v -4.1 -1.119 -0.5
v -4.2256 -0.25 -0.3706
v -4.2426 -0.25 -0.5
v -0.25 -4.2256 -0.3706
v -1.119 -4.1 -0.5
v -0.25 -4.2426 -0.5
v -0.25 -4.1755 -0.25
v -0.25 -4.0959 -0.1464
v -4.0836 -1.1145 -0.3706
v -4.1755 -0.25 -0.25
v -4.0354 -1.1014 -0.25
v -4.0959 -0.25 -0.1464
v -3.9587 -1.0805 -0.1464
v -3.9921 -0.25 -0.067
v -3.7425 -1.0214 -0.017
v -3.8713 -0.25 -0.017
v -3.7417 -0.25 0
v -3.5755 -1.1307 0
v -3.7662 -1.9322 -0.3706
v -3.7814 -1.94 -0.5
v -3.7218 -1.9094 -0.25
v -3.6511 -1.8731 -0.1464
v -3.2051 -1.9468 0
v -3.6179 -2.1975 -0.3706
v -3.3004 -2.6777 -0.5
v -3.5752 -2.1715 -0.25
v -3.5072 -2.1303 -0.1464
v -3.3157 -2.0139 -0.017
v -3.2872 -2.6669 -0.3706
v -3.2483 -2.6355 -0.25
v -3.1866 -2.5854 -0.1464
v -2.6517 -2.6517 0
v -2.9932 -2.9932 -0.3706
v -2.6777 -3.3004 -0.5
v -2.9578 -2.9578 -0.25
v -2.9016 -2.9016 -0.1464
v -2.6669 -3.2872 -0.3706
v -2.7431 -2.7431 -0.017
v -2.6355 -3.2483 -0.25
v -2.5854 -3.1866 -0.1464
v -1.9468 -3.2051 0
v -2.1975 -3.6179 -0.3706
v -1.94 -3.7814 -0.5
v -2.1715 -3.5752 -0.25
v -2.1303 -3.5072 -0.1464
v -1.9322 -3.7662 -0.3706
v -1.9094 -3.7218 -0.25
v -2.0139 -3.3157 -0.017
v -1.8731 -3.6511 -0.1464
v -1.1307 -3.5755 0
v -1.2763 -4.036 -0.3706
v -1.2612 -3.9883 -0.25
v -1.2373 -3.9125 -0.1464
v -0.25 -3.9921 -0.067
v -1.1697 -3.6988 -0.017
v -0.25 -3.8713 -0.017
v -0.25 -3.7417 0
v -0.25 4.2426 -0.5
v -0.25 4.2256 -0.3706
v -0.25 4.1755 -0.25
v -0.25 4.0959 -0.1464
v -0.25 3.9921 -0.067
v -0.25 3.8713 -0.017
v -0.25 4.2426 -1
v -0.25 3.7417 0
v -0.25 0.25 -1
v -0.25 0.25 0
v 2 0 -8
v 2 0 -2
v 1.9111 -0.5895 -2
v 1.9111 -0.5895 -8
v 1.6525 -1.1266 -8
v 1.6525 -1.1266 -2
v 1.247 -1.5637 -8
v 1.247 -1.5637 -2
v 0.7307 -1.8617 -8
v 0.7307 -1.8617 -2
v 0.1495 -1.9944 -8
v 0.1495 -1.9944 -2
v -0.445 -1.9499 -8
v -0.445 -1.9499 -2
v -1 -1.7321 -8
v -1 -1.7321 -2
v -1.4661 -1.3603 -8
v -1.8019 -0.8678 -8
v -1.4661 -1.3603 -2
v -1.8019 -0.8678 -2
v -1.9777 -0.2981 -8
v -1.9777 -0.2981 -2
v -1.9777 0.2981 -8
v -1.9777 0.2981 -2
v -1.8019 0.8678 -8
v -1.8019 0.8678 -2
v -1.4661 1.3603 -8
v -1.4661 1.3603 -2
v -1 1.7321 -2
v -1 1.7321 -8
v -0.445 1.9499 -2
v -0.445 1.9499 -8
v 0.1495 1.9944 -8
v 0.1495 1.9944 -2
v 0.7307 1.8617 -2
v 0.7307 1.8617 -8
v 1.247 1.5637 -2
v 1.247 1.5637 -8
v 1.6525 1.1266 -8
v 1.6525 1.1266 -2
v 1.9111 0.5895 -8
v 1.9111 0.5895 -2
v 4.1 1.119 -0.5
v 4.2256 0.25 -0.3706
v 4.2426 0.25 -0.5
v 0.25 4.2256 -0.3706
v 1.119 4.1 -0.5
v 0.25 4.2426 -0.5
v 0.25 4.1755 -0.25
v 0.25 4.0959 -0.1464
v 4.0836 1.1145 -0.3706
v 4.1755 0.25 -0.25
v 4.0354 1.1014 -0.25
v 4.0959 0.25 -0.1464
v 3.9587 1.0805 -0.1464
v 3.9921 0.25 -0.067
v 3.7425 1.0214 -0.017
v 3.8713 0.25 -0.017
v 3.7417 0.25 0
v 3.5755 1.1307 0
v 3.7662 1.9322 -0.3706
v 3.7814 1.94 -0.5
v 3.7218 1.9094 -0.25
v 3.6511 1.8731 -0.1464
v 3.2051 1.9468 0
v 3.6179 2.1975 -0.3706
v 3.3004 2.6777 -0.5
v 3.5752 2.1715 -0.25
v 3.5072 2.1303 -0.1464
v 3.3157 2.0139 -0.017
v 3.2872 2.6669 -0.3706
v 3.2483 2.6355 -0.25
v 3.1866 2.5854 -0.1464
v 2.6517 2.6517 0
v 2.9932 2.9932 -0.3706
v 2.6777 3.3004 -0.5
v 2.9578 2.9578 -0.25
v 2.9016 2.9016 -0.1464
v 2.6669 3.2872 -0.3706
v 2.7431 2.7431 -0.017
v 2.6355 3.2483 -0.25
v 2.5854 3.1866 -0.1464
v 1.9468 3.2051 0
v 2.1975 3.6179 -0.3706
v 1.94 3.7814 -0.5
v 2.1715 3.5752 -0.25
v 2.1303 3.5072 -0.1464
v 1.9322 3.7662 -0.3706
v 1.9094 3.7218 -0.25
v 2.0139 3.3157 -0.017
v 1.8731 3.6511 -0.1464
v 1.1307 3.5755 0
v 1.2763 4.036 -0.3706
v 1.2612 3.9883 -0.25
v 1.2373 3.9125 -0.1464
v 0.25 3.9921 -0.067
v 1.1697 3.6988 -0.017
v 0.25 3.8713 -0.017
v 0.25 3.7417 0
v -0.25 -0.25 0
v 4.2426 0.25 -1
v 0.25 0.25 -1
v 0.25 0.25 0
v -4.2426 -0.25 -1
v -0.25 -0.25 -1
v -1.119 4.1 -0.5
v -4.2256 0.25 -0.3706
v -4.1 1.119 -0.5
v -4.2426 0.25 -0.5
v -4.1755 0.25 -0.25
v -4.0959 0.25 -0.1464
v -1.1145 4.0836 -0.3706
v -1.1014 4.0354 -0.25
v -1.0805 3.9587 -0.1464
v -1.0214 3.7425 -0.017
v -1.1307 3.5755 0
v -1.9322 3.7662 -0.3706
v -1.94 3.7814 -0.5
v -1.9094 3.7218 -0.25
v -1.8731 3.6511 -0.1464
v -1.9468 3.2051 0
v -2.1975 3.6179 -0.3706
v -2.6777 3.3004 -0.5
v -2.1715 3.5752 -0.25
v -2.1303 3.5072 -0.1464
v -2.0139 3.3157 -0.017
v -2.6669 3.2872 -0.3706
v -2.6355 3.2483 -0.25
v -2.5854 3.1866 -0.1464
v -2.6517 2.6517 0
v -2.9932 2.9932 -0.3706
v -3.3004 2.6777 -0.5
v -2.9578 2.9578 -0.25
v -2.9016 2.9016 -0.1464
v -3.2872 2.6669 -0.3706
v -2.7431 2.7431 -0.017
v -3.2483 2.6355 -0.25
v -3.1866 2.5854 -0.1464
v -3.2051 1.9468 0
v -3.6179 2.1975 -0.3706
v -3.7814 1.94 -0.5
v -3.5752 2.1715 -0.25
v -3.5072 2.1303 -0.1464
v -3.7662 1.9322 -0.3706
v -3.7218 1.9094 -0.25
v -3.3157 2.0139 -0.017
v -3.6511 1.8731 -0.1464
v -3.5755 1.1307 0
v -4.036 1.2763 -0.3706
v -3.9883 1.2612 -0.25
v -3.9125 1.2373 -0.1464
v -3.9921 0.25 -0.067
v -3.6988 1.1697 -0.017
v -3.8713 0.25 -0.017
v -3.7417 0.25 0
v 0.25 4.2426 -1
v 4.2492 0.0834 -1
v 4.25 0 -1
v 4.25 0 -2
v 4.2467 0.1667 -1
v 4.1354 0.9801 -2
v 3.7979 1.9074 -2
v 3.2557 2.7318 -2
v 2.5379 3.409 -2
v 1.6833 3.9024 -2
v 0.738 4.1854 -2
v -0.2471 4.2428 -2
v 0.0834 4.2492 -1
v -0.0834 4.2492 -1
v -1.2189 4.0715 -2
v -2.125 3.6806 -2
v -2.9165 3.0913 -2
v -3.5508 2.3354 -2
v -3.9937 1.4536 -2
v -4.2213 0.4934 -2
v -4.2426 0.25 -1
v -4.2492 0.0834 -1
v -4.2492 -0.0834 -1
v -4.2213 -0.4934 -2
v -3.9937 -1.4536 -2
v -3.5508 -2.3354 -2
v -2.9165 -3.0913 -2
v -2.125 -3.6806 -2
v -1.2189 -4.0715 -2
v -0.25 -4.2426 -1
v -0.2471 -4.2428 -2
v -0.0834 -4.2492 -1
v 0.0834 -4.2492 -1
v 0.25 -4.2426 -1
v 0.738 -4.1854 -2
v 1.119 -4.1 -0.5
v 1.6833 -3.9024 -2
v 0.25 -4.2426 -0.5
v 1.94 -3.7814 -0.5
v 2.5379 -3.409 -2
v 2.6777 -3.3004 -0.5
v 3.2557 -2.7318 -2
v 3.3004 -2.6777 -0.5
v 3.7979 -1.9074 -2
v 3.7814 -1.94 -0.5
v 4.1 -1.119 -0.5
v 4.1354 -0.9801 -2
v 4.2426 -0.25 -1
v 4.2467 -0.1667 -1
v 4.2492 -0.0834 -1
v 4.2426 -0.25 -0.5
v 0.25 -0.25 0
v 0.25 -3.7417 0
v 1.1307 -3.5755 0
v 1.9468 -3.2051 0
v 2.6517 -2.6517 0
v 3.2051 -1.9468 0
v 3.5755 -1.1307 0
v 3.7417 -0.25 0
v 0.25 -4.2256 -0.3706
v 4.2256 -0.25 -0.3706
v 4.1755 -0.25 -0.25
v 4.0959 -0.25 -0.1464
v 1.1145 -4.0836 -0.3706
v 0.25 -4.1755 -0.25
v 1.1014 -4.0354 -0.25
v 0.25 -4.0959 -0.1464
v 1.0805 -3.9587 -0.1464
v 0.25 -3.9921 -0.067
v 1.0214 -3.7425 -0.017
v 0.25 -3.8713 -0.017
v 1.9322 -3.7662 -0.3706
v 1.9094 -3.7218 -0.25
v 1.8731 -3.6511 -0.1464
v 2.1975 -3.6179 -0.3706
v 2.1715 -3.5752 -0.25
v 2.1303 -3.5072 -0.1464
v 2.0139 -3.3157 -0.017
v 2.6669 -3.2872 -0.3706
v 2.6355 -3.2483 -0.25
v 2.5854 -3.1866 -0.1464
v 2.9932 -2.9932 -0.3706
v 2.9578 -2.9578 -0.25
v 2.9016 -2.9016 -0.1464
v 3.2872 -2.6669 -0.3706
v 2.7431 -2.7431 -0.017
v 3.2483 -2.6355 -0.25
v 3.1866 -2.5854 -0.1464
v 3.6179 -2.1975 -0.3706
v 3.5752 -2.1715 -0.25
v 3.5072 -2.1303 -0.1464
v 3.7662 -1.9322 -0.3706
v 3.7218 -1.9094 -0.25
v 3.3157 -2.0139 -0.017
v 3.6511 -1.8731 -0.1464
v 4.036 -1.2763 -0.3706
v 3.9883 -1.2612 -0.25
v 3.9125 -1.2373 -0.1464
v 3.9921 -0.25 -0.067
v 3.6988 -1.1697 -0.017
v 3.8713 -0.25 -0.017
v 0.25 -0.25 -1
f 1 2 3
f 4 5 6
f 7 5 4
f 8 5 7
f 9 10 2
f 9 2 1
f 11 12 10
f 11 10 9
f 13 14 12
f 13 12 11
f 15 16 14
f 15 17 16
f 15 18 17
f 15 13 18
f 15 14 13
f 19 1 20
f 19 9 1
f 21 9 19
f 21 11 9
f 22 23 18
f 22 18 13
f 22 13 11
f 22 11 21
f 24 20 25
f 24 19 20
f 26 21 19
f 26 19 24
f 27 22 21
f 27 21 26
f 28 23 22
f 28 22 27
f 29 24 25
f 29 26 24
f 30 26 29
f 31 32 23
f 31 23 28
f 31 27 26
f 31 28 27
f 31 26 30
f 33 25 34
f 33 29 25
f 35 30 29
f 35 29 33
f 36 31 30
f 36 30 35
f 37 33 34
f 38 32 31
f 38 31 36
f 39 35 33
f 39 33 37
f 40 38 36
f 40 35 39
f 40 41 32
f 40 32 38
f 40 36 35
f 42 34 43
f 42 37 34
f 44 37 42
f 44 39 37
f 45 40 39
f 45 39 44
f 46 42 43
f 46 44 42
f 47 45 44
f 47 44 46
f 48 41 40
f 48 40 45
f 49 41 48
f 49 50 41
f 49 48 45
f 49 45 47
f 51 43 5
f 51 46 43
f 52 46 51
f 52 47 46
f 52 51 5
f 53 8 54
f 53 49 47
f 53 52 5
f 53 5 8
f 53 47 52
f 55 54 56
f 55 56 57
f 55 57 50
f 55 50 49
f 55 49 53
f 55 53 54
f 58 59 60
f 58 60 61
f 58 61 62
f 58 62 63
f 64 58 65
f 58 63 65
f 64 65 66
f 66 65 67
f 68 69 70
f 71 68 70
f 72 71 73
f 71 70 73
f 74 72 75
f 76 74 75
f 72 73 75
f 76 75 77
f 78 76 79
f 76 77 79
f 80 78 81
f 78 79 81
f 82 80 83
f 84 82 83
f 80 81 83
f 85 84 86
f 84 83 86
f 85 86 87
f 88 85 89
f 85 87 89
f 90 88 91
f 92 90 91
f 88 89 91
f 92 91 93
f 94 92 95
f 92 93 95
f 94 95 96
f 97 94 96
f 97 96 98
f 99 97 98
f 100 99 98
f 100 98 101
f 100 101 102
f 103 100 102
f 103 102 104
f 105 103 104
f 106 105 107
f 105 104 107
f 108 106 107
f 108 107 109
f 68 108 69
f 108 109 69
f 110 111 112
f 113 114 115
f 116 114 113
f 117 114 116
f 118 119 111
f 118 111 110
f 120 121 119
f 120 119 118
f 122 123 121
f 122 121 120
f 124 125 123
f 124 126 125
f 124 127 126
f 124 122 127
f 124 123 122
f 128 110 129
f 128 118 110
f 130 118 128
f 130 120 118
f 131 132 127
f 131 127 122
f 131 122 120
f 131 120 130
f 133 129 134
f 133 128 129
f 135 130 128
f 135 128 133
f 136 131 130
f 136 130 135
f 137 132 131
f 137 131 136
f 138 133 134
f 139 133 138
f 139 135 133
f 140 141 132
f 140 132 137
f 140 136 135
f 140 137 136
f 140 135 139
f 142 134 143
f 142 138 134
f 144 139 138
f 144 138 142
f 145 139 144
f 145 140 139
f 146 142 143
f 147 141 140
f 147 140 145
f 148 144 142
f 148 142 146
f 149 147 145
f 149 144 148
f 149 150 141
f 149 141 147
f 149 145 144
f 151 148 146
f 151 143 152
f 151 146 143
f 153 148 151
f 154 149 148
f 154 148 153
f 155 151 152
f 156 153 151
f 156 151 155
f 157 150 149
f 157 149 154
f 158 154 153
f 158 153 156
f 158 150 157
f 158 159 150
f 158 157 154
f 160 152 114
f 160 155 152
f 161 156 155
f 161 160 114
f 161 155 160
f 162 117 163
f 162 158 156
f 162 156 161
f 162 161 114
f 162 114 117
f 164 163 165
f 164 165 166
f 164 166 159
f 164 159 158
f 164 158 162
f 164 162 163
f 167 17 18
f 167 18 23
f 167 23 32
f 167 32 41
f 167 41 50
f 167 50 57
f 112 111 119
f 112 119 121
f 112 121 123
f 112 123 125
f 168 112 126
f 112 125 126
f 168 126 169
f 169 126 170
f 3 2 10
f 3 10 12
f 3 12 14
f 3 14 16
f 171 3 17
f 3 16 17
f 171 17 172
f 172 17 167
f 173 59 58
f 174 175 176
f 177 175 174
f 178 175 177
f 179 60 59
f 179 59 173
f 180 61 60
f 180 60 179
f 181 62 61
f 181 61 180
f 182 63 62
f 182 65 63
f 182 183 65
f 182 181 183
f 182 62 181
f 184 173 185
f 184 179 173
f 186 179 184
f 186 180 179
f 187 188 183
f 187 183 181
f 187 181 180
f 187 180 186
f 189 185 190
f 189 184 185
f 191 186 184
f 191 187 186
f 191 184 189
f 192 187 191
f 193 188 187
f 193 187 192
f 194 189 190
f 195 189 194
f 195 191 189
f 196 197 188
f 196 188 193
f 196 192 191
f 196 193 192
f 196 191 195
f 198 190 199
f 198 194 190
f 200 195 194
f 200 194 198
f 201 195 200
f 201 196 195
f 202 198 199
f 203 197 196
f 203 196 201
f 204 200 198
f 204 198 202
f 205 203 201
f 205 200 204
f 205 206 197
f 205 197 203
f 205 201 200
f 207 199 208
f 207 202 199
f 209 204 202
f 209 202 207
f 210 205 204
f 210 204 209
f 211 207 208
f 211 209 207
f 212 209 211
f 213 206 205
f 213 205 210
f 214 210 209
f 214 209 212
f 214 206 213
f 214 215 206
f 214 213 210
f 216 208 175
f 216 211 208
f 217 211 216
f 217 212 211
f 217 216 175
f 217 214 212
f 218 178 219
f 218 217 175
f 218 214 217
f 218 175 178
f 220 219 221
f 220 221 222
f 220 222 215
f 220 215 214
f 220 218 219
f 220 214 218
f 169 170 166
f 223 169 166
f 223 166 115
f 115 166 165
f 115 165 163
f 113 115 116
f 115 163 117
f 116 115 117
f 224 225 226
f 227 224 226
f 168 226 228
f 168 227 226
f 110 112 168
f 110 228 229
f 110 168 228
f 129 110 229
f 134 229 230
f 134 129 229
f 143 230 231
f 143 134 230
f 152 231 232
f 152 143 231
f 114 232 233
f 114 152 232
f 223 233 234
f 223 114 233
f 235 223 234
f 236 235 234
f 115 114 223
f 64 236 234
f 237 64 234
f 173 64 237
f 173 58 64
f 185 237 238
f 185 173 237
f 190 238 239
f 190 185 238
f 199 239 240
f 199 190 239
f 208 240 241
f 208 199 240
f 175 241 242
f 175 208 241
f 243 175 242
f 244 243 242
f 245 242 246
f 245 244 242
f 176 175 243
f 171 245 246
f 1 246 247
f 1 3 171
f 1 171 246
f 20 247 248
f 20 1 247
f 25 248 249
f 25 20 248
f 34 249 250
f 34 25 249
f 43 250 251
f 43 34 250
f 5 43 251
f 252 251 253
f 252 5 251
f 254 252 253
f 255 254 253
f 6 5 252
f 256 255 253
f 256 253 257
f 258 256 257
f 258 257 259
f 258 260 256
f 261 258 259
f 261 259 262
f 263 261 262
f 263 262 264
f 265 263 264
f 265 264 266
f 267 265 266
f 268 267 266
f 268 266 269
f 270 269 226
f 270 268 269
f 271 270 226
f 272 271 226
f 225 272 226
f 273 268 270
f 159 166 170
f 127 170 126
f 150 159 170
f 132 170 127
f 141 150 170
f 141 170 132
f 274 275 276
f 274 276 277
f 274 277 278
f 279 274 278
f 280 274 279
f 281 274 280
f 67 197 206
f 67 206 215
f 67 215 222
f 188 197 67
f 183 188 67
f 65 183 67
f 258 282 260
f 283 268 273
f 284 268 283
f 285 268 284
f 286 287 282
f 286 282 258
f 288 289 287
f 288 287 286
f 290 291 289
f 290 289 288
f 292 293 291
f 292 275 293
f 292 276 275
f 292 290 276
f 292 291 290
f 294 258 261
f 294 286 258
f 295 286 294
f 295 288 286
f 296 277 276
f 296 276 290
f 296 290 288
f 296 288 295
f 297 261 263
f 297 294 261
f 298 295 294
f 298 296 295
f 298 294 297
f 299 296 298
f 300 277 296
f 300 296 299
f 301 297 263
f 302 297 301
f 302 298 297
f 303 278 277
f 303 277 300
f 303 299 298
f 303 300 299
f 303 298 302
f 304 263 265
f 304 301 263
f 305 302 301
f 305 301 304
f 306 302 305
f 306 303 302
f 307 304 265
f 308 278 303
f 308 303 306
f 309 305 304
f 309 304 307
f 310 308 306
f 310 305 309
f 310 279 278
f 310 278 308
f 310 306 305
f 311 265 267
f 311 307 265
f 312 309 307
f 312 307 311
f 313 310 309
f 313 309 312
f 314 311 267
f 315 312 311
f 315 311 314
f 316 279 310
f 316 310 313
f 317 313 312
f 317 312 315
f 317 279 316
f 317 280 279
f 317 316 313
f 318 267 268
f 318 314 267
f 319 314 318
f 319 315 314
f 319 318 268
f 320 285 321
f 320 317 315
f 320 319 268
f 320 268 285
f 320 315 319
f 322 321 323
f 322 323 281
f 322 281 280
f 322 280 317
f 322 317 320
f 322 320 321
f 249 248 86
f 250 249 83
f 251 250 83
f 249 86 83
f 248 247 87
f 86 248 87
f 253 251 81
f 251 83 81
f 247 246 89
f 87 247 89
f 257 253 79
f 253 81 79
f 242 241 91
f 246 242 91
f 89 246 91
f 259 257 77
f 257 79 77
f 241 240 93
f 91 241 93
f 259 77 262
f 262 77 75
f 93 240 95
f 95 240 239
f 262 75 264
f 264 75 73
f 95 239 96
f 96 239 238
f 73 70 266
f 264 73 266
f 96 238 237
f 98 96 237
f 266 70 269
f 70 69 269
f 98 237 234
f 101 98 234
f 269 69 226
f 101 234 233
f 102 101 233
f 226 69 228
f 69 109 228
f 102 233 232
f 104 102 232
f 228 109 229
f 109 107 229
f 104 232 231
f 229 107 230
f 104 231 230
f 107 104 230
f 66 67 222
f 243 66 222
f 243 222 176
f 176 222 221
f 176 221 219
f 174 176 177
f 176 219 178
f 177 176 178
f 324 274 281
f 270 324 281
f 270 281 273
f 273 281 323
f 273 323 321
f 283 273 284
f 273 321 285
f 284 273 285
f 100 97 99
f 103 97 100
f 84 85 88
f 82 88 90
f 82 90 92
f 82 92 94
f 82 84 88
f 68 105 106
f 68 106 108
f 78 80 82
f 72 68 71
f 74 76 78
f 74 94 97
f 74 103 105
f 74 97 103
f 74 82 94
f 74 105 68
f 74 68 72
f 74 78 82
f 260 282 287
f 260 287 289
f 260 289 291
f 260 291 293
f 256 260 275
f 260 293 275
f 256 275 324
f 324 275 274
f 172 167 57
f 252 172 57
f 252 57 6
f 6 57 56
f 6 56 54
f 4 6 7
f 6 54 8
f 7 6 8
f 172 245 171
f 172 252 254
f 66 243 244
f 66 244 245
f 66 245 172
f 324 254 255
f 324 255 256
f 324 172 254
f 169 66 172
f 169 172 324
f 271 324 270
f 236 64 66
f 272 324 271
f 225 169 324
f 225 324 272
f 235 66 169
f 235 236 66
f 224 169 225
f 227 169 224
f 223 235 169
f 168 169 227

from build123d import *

# Parameters (mm, degrees)
SKETCH1_R           = 4.25
BOSS_EXTRUDE1_DEPTH = 2
SKETCH2_R           = 2
BOSS_EXTRUDE2_DEPTH = 6
CUT_EXTRUDE1_DEPTH  = 1
FILLET1_R           = 0.5


with BuildPart() as part:
    # Sketch1 → Boss-Extrude1 (new body)
    with BuildSketch(Plane.XY):
        Circle(SKETCH1_R)
    extrude(amount=-BOSS_EXTRUDE1_DEPTH)

    # Sketch2 → Boss-Extrude2 (add)
    with BuildSketch(Plane(origin=(0, 0, -2), x_dir=(-1, 0, 0), z_dir=(0, 0, -1))):
        with Locations(Location((0, 0, 0), (0, 0, 180))):
            Circle(SKETCH2_R)
    extrude(amount=BOSS_EXTRUDE2_DEPTH)

    # Sketch3 → Cut-Extrude1 (cut)
    with BuildSketch(Plane.XY):
        Polygon((-4.25, -0.25), (-0.25, -0.25), (-0.25, -4.25), (0.125, -4.817995393), (0.25, -4.25), (0.25, -0.25), (4.25, -0.25), (4.809434234, 0), (4.25, 0.25), (0.25, 0.25), (0.25, 4.25), (0, 4.809434234), (-0.25, 4.25), (-0.25, 0.25), (-4.25, 0.25), (-4.9274721, -0.052748768), align=None)
    extrude(amount=-CUT_EXTRUDE1_DEPTH, mode=Mode.SUBTRACT)

    # Fillet1
    fillet1_edges = [part.edges().sort_by_distance(p)[0] for p in [
        (-3.00520382, 3.00520382, 0),
        (-3.00520382, -3.00520382, 0),
        (3.00520382, -3.00520382, 0),
        (3.00520382, 3.00520382, 0),
    ]]
    fillet(fillet1_edges, radius=FILLET1_R)


solid = part.part
